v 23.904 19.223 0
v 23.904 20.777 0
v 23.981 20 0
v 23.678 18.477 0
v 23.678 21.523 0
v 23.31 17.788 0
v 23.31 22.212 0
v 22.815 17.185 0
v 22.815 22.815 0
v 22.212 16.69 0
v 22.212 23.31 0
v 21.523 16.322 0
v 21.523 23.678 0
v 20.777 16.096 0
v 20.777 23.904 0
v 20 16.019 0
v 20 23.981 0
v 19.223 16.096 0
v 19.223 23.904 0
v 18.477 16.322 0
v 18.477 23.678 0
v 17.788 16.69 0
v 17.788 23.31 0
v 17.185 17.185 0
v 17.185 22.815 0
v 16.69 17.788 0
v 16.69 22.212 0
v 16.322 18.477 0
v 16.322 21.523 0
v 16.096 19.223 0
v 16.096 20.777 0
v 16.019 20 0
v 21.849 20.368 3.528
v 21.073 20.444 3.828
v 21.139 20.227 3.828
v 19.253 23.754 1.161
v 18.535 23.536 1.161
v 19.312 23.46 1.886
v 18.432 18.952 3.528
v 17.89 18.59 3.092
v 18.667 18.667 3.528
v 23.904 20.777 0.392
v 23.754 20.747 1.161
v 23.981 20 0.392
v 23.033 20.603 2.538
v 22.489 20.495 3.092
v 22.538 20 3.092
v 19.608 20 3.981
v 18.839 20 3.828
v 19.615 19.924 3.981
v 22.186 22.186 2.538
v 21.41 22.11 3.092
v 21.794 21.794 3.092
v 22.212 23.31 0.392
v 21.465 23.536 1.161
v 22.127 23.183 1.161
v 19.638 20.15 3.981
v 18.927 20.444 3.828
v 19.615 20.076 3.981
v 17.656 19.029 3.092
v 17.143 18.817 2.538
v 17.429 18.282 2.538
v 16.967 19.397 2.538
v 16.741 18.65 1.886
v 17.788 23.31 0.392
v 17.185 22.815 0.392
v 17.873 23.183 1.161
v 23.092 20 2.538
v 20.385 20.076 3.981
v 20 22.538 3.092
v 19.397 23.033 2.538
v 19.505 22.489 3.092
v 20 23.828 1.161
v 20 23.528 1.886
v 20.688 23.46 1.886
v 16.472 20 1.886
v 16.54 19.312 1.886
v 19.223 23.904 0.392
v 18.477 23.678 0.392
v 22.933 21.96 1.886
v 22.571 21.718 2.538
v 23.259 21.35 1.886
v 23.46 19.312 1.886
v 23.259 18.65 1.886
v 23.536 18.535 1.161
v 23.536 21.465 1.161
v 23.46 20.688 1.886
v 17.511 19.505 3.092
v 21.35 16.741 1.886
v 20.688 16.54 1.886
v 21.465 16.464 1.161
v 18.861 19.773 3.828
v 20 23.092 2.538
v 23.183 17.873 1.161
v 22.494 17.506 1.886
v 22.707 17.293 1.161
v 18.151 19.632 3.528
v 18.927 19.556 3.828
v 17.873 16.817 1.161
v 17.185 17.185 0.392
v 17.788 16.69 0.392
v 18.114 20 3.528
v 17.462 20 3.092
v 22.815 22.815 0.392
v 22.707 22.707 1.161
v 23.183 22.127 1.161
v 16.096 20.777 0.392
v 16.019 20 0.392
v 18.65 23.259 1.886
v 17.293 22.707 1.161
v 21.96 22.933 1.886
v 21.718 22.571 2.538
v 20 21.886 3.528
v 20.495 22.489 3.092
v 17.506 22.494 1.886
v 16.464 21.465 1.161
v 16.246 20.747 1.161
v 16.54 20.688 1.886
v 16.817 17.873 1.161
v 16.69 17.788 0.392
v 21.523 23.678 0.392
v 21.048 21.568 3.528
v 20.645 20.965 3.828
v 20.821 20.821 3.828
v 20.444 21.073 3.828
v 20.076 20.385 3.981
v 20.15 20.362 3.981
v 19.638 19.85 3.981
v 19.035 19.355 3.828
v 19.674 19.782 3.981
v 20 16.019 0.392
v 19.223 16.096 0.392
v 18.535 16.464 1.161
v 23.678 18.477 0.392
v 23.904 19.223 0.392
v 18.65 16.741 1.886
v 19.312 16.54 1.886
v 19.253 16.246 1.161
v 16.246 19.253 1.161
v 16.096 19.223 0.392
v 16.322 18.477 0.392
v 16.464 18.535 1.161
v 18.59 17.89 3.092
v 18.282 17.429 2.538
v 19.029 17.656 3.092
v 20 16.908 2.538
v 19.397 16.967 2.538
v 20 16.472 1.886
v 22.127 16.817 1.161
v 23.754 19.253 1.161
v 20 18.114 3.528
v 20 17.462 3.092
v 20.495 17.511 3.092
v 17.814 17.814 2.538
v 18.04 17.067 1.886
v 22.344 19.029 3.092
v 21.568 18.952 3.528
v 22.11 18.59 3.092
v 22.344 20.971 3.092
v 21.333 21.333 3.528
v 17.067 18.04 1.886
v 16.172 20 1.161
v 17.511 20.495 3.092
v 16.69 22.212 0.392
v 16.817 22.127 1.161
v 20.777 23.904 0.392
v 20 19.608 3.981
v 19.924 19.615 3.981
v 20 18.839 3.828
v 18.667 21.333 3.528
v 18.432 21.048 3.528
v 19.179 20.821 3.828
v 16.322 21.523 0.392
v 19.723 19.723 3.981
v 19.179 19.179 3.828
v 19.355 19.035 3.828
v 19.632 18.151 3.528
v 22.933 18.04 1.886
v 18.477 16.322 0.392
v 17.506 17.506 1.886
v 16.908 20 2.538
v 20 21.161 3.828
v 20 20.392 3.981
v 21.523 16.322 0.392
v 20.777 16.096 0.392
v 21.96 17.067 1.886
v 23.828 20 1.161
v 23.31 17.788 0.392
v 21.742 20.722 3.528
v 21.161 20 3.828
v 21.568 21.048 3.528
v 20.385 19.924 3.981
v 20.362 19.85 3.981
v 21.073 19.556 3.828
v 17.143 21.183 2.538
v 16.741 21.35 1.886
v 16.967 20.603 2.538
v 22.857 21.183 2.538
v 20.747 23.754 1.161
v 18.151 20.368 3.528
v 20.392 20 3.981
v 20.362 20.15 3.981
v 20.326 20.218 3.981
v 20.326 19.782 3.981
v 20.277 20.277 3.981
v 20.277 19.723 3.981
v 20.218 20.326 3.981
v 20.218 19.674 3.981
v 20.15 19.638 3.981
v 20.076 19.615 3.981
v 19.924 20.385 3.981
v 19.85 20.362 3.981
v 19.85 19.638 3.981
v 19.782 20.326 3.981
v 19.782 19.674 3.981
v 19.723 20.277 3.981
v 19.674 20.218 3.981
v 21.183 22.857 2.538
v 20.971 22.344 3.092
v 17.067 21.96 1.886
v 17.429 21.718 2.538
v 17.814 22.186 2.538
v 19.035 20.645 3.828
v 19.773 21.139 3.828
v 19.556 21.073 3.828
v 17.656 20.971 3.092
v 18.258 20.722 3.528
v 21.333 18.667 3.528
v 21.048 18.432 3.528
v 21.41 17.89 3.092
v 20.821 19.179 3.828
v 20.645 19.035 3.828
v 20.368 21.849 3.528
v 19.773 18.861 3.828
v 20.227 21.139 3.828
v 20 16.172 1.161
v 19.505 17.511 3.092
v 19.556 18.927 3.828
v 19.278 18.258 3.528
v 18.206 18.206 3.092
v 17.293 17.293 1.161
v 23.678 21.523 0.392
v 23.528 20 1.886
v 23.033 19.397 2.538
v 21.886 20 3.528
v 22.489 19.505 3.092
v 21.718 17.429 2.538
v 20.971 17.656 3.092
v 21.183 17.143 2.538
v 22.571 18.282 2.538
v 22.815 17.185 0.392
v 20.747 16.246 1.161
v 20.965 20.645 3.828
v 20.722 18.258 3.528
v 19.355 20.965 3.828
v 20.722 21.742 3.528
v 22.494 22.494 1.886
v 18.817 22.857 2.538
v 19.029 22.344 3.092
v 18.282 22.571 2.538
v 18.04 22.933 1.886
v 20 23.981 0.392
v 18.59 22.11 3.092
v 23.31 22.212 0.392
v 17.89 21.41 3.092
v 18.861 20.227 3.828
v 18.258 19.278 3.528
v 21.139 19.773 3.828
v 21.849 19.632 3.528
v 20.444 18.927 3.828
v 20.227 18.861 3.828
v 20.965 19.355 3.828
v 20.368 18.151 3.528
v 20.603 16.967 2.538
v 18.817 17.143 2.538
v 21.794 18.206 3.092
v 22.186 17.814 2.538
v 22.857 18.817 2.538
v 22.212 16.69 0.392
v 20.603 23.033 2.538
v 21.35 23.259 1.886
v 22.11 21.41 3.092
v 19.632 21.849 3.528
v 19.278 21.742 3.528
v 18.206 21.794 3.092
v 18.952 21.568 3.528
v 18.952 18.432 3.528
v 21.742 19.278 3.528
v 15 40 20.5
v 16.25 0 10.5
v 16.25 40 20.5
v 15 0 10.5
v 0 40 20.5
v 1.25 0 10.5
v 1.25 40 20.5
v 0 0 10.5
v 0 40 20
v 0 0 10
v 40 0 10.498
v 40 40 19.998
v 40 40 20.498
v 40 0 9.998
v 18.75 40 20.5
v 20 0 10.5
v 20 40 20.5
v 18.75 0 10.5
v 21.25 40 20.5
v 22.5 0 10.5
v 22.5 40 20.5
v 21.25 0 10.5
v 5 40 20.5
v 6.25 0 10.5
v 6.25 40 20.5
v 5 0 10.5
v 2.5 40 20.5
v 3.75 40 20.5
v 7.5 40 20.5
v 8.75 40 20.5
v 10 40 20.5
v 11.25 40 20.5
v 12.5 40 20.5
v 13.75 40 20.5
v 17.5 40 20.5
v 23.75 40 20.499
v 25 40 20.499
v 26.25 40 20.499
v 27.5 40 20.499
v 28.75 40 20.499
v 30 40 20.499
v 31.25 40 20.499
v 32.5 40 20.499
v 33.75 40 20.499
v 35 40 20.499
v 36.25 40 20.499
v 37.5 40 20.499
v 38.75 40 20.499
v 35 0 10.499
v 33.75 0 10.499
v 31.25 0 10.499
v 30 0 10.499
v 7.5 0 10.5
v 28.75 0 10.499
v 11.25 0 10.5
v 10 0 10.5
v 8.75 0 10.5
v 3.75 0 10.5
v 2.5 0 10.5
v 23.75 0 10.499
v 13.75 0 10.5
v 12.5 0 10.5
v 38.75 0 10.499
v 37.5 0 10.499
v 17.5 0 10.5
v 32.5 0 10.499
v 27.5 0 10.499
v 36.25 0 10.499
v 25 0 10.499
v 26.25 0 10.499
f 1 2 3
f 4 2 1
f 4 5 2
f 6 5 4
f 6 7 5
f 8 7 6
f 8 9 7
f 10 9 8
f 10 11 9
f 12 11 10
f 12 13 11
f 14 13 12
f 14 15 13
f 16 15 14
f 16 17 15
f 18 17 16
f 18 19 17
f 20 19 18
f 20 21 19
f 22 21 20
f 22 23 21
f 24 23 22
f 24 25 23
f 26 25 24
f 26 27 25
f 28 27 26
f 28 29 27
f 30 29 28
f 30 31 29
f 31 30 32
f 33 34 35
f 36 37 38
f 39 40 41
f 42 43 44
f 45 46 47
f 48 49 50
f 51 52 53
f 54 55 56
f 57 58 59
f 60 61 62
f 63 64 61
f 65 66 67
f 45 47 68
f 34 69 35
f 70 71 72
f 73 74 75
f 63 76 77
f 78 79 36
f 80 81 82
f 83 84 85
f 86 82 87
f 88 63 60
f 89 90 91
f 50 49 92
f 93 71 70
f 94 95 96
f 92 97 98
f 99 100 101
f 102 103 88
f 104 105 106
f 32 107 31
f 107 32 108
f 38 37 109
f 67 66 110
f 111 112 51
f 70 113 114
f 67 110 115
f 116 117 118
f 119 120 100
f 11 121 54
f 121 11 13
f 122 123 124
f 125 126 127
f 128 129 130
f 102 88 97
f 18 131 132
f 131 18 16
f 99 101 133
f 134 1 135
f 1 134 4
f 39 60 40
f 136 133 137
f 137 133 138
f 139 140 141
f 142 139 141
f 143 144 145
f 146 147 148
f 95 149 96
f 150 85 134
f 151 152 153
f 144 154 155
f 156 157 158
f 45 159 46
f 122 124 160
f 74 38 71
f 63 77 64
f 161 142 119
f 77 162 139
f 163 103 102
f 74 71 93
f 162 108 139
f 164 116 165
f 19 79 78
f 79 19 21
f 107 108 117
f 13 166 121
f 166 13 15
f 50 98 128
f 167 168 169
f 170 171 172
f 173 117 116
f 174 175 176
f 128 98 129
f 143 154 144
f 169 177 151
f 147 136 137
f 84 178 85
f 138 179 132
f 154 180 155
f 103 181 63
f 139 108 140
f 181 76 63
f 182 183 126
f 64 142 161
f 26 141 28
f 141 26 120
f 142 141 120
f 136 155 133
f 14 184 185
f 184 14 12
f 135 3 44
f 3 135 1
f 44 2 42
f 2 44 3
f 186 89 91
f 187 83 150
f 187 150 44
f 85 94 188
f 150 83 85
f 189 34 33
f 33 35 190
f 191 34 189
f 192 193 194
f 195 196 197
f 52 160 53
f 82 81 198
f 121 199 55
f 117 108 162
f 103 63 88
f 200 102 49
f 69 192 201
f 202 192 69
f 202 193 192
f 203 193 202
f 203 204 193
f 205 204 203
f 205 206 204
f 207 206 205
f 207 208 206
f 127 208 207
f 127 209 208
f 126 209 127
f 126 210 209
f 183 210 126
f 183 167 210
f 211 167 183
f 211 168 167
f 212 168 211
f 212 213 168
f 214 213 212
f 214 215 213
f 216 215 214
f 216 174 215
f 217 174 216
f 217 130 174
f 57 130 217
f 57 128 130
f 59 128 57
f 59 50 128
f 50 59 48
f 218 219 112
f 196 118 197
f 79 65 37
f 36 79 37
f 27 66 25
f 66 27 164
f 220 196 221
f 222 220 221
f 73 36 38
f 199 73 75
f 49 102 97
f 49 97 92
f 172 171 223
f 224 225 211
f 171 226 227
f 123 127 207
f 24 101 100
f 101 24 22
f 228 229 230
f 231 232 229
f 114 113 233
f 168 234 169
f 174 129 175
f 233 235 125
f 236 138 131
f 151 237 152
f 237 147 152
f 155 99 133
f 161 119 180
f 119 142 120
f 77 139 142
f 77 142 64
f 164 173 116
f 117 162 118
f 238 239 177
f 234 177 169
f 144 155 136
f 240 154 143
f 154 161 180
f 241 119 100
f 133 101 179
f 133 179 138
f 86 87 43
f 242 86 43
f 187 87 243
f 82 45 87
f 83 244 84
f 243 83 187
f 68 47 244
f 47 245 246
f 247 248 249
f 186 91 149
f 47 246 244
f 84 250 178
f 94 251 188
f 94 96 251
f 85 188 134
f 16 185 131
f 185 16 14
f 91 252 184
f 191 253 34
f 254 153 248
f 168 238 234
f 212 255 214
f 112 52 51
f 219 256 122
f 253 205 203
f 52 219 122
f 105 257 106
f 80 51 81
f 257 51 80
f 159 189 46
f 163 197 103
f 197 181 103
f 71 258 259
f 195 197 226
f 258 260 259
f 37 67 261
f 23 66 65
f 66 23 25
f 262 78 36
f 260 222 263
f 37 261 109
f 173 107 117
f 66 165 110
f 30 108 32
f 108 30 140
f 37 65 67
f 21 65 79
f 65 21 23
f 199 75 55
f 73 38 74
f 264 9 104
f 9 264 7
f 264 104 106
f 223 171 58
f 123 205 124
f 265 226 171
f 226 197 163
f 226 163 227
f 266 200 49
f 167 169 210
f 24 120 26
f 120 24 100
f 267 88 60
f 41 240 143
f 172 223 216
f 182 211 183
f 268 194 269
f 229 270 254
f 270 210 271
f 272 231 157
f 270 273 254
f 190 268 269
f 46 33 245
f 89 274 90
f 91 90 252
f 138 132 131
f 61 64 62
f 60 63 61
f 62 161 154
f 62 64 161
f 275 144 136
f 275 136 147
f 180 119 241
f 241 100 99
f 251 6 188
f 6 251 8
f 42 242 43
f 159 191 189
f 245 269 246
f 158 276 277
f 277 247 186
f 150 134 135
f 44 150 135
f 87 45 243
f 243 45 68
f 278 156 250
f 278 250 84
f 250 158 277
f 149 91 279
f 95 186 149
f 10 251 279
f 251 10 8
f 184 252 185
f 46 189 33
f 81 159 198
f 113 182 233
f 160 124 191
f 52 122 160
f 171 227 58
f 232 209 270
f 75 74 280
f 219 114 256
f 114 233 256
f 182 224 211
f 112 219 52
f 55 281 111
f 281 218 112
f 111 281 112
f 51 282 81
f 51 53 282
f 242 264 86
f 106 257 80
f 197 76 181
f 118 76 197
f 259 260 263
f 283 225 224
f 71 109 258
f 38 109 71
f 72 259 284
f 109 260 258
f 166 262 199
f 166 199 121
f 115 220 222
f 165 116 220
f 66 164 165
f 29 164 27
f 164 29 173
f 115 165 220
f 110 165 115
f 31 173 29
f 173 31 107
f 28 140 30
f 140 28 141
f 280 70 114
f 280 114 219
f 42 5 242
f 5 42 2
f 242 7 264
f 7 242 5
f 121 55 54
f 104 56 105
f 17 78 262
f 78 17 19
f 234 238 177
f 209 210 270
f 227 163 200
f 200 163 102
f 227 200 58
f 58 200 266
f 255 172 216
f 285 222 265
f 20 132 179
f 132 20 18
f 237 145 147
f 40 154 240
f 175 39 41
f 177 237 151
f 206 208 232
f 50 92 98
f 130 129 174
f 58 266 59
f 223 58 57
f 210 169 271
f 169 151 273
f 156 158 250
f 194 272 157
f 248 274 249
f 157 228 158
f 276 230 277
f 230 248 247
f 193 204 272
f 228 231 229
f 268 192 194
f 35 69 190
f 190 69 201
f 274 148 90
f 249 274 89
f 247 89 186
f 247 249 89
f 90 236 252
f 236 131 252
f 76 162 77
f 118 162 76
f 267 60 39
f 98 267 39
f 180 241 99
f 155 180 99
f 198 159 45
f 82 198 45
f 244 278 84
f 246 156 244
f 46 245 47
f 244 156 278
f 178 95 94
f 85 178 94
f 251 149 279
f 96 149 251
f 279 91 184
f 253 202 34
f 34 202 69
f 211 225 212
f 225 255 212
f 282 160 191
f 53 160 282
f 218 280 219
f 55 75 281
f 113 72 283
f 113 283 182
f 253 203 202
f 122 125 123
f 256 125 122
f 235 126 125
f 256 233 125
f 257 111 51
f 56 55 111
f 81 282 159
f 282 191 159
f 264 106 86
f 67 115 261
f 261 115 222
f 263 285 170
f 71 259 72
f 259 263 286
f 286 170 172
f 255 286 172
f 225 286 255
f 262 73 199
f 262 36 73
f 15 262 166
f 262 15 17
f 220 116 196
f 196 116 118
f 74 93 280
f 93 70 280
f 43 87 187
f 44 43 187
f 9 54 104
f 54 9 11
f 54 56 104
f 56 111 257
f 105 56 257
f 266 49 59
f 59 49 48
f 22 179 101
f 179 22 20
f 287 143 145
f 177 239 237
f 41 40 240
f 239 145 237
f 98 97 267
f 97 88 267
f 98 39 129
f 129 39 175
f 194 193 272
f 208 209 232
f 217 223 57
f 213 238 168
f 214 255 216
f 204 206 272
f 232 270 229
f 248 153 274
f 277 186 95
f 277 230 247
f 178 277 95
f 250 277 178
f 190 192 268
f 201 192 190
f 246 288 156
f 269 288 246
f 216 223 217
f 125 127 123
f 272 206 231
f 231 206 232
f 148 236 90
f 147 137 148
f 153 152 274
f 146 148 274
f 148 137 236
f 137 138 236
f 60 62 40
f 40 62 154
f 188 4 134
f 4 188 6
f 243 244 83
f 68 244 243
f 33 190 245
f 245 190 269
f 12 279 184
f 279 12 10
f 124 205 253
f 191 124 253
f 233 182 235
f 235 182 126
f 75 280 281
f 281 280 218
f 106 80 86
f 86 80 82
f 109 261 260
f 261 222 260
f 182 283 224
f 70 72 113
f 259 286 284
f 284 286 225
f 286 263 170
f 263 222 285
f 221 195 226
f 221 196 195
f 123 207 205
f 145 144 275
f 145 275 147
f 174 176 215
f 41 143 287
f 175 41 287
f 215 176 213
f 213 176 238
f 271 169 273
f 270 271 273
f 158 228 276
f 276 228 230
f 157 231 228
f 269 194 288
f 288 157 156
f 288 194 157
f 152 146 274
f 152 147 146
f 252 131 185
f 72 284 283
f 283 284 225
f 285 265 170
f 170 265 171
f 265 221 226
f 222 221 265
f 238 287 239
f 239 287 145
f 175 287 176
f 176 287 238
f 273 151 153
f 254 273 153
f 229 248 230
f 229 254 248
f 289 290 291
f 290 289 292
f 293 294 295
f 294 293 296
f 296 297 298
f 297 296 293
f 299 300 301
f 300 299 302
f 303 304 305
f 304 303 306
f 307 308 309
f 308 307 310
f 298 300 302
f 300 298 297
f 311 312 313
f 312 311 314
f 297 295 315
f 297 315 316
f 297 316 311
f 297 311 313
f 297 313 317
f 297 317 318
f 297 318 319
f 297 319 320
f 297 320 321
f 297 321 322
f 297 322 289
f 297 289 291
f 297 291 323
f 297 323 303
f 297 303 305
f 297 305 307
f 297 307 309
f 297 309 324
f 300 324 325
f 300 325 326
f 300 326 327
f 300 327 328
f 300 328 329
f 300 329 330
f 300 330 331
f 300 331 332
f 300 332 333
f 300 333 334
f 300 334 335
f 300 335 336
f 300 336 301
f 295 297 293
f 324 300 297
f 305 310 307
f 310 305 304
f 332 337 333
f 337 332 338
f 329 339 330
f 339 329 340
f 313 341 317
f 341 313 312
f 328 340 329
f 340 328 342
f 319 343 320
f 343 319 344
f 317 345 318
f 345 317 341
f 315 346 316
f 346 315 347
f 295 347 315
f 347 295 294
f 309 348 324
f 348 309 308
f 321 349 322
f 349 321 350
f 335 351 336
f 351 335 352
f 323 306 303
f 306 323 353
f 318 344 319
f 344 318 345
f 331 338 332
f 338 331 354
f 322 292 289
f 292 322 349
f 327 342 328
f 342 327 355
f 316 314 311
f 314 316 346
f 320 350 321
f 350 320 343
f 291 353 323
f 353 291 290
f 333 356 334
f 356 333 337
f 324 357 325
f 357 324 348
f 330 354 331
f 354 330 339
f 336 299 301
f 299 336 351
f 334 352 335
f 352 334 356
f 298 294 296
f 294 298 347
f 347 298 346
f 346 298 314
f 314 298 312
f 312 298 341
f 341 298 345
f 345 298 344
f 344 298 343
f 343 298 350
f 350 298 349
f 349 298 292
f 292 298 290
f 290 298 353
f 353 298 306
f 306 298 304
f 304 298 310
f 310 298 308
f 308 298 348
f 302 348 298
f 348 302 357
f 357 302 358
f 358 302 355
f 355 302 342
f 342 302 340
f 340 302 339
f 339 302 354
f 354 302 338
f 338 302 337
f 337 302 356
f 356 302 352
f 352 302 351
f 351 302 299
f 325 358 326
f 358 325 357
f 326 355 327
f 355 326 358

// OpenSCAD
total_height = 24; // mm

base_d = 8; // mm
stem_d = 6; // mm
handle_d = 4; // mm
handle_h = 10; // mm

fin_count = 16;
fin_d1 = handle_d;
fin_h2 = 6; // middle bulge height from base
fin_d = 0; // mm, d2, middle_bulge size
fin_d3 = stem_d;
fin_l=.75;
fin_w=40;
fin_resolution_z = 8;
fin_h = stem_height;

shell_ratio = 2.2;

fin_r = fin_d/2;
twist = .8*360/fin_count;
fin_twist=0;

binding_height = 1;
binding_d = 0.250 * fin_w;

epsilon = 0.01;

module fin_shape() {
    scale([fin_w, fin_l]) square(1, center=true); 
    //circle($fn=8);
    
}

stem_height = total_height - base_d/2 - handle_h;
fin_h = total_height - base_d/2 - handle_h;
fin_scale = [
  for (x=steps(0, fin_resolution_z, fin_h))
     .06 + pow(1-x/fin_h, 2)
];
//echo(len(fin_scale));
  
function curve(vec, h, t) = [
  for(i=[0:len(vec)-1])
    [
  // layerheight
  h/len(vec)
  ,
  // scale
  //1//vec[i]
  [1-(i*1/len(vec)), 1-(i*.74/len(vec))],
  ,
  //[0,0,0]
  // rotate
  [0, 0, -t/len(vec)]
  ,
  // translate
  [-fin_d/len(vec), 0 ,0]
  ]
];
fin_curve = curve(fin_scale, fin_h, fin_twist);
  
//echo(fin_curve);
  
function steps(start, n, end) = [start : (end - start) / (n - 1) : end];
function sum(vec, i=0, a=0) = i < len(vec) ? sum(vec, i+1, a+vec[i]) : a;

module fin_extrude(stepdef, twist) {
    // [height, scale, rotate=[x, y, z], offset=[x, y]]
    numsteps = len(stepdef);
    totalheight = stepstart(numsteps);

    function stepheight(i) = i <= 0 ? 0 : stepdef[i][0];
    function stepscale(i) = i <= 0 ? 1 : stepdef[i][1];
    function stepoffx(i) = i <= 0 ? 0 : stepdef[i][3][0] ? stepdef[i][3][0] : 0;
    function stepoffy(i) = i <= 0 ? 0 : stepdef[i][3][1] ? stepdef[i][3][1] : 0;
    function stepr(i) = i <= 0 ? 0 : stepdef[i][2] ? stepdef[i][2]: [0, 0, 0];

    function stepstart(i) = i <= 0 ? 0 : sum([for(j = [0 : i-1]) stepheight(j)]);      
    function steptwist(i) = i <= 0 ? 0 : twist * (stepheight(i) / totalheight);
    function steptwiststart(i) = i <= 0 ? 0 : sum([for(j=[0 : i-1]) steptwist(j)]);
    function steprstart(i) = i <= 0 ? [0, 0, 0] : sum(a=[0,0,0], [for(j = [0: i-1]) stepr(i)]);
        
    function steptx(i) = i <= 0 ? 0 : sum(a=0, [for(j = [0 : i-1]) stepoffx(j)]);
    function stepty(i) = i <= 0 ? 0 : sum(a=0, [for(j=[0:i-1]) stepoffy(j)]);
    

        
    
    module step(i) {
        //echo("step", stepdef[i]);
        //echo(steptx(i), stepty(i));
        scalestart = stepscale(i-1);
        scaleend = stepscale(i) / stepscale(i-1);
        rotate([0, 0, -steptwiststart(i)])

        translate([0, 0, stepstart(i) + stepheight(i)/2])

        scale(scalestart)

            linear_extrude(
                    slices=2,
                    height=stepheight(i),
                    center=true,
                    twist=steptwist(i),
                    scale=[scaleend])

                rotate(steprstart(i))
                translate([steptx(i), stepty(i), 0])

                    children();
        
    }
      
    for (i = [1:numsteps-1]) hull() {step(i-1) children(); step(i) children();}
}


module ring(d) {
    /*difference() {
    cylinder(d=d1, h=h);
    translate([0, 0, -epsilon])
    cylinder(d=d2, h=h+epsilon*2);
    }*/
    
    rotate_extrude() {
        translate([d, 0, 0]) children();
    }
    
}


module fin1(i) {
    
    fin_extrude(fin_curve, twist=twist) {
        translate([fin_d, 0, 0])

         {
            fin_shape();
 //   color([.75, .7, .8, 0.2])
 //           scale([fin_w, fin_l])
 //               circle($fn=8, 1);
        }
    };

}

module fin(i, height=.5, $fn=32, scale=[fin_w, fin_w, fin_h]) {
    
    function finfn(x, y) =  x+cos(y);
    heightmap = [for (x = [0 : 1/$fn : 1], y = [0 : 1/$fn : 1]) finfn(x, y)];

    extrude_heightmap(heightmap, height, size=scale);

    
}



/*

heightmap must be a vector of length $fn*$fn. will be considered as z-heights applied in a square lattice over a size-square surface, in x-major order. 

The height parameter is the thickness of the output.
The size is the x by y square for a scalar, or [x, y] vector (or a [x, y, z-scale] vector if you need to scale the heightmap here instead of at generation time, but that's probably not what you want)

*/
 module extrude_heightmap(heightmap, height=1, size=1, convexity=10) {
    scale = len(size) == 3
        ? [[size[0], 0, 0], [0, size[1], 0], [0, 0, size[2]]]
        : len(size) == 2
        ? [[size[0], 0, 0], [0, size[1], 0], [0, 0, 1]]
        : len(size) == 1
        ? [[size[0], 0, 0], [0, 1, 0], [0, 0, 1]]
     // Scalar size is x by y, not z
        : [[size, 0, 0], [0, size, 0], [0, 0, 1]];
    
    function reverse(list) = [for (i = [len(list)-1:-1:0]) list[i]];
    function zoffset(t, vec) = [for (p = vec) [p[0], p[1], p[2] + t]];

    // point index
    function P(c, r, z) =  c + r*($fn+1) + z*($fn+1)*($fn+1);

    /*
        square facet:
          A: 0, 0     C: 0, 1  
          B: 1, 0     D: 1, 1      
        triangles: ABD ADC
          ABD = [0, 0], [1, 0], [1, 1]
          ADC = [0, 0], [1, 1], [0, 1]
        
    */
    function faces() =
        let(
            cw = [
              [[0, 0], [1, 0], [1, 1]],
              [[0, 0], [1, 1], [0, 1]]
            ],
            ccw = [for (f = cw) reverse(f)],
            bot   = [for (c = [0 : $fn-1], r = [0 : $fn-1], tri = ccw) 
                [for(p = tri) P(c + p[0], r + p[1], 1)]],
            top   = [for (c = [0 : $fn-1], r = [0:$fn-1], tri = cw) 
                [for (p = tri) P(c + p[0], r + p[1], 0)]],
            south = [for (c = [0 : $fn-1], r = [0], tri = ccw)
                [for (p = tri) P(c + p[0], r, p[1])]],
            north = [for (c = [0 : $fn-1], r = [$fn], tri = cw)
                [for (p = tri) P(c + p[0], r, p[1])]],        
            west  = [for (c = [0], r = [0 : $fn-1], tri = ccw)
                [for (p = tri) P(c, r+p[1], p[0])]],
            east = [for(c = [$fn], r = [0 : $fn-1], tri = cw)
                [for (p = tri) P(c, r+p[1], p[0])]]
       )
       concat(top, bot, south, north, east, west);

    function points(heightmap, height) = 
        let(
            bot = [for (c = [0 : $fn], r = [0 : $fn])
                let(x=c/$fn, y=r/$fn, z=heightmap[P(c, r, 0)])
                 scale * [x, y, z]]   
         )
         concat(zoffset(height, bot), bot);
     
    polyhedron(
        points=points(heightmap, height),
        faces=faces(),
        convexity=convexity
    );
} 




module base() {
    sphere($fn=32, d=base_d);
}


module stem() {
    // main body
    cylinder($fn=fin_count, d1=stem_d, d2=handle_d, h=stem_height);
    
    // handle
    translate([0, 0, total_height-handle_h-base_d/2-epsilon])
      cylinder($fn=16, d=handle_d, h=handle_h+epsilon);
    
    // binding / adapter
    module binding() {

    translate([0, 0, total_height-base_d/2-handle_h-epsilon-binding_height/2])
       linear_extrude(scale=(handle_d / binding_d), height=binding_height)
            circle($fn=fin_count, d=binding_d);
     translate([0, 0, total_height-base_d/2-handle_h-epsilon-binding_height/2])
       mirror([0, 0, 1])
       linear_extrude(scale=1, height=binding_height)
            circle($fn=fin_count, d=binding_d);
    
    translate([0, 0, total_height-base_d/2-handle_h-epsilon-binding_height*1.5])
       mirror([0, 0, 1])
       linear_extrude(scale=(handle_d / binding_d), height=binding_height)

            circle($fn=fin_count, d=binding_d);
    }
    
    translate([0, 0, -.45]) binding();

}

module shell1() {
   
/*
 shell cross section diagram
           .
          /|
         / |
        /  |
       .   |
      /|   |
     /#/   |
    /##|   |
   /##/[h] | [th]
  /##|     | 
 /a1#/a2   |
.---.--.---.

 [t]  d2
  inset+t
    [d/2]
*/
    translate([0, 0, 5])
    {
    d = fin_w+2;
    t = 1.4;
    th = stem_height;
    shell_height = stem_height/shell_ratio;
    h = shell_height;

    d2 = d/2-t;
    inset = h/th * d2 - t;
    
    rotate_extrude(){
        translate([0, 0])
    polygon([[d/2, 0],  [d/2-inset, h], [d2, 0]]);
    }
    
    mirror([0, 0, 1])
    rotate_extrude(){
    
    polygon([[d/2, 0],  [d/2-inset, h], [d2, 0]]);
    }
}
    
    
}

module shell2() {
     d = fin_w+2;
    t = 1.4;
    th = stem_height;
    shell_height = stem_height/shell_ratio;
    h = shell_height;

    d2 = d/2-t;
    inset = h/th * d2 - t;
    
    difference() {
        hull() fins();
        translate([0, 0, -epsilon])
        cylinder(total_height, r=d/2-inset);
    }
}

module fins() {
    for(i=[0 : fin_count-1]) {
        rotate([0, 0, (i) * 360 / fin_count]) fin(i=i);
    }

}


module spinner() {
    //base();
    
    stem();
    fins();

    //shell2();
    
    // bracing
    b = fin_d-fin_w+(fin_h/fin_resolution_z)+.5;
    //ring(d=b) polygon([[1, 0],[.5,.5],[0, 0]]);
    
    d = fin_d+fin_w/2-(fin_h/fin_resolution_z);
    ring(d=d) polygon([[1, 0],[-1,2],[0, 0]]);
}

//spinner();

fin(1);

translate([fin_w/2, fin_w/2,])
intersection() {
    translate([-base_d/2, -base_d/2, 0])
    cube([base_d, base_d, base_d/2]);
    base();
}
